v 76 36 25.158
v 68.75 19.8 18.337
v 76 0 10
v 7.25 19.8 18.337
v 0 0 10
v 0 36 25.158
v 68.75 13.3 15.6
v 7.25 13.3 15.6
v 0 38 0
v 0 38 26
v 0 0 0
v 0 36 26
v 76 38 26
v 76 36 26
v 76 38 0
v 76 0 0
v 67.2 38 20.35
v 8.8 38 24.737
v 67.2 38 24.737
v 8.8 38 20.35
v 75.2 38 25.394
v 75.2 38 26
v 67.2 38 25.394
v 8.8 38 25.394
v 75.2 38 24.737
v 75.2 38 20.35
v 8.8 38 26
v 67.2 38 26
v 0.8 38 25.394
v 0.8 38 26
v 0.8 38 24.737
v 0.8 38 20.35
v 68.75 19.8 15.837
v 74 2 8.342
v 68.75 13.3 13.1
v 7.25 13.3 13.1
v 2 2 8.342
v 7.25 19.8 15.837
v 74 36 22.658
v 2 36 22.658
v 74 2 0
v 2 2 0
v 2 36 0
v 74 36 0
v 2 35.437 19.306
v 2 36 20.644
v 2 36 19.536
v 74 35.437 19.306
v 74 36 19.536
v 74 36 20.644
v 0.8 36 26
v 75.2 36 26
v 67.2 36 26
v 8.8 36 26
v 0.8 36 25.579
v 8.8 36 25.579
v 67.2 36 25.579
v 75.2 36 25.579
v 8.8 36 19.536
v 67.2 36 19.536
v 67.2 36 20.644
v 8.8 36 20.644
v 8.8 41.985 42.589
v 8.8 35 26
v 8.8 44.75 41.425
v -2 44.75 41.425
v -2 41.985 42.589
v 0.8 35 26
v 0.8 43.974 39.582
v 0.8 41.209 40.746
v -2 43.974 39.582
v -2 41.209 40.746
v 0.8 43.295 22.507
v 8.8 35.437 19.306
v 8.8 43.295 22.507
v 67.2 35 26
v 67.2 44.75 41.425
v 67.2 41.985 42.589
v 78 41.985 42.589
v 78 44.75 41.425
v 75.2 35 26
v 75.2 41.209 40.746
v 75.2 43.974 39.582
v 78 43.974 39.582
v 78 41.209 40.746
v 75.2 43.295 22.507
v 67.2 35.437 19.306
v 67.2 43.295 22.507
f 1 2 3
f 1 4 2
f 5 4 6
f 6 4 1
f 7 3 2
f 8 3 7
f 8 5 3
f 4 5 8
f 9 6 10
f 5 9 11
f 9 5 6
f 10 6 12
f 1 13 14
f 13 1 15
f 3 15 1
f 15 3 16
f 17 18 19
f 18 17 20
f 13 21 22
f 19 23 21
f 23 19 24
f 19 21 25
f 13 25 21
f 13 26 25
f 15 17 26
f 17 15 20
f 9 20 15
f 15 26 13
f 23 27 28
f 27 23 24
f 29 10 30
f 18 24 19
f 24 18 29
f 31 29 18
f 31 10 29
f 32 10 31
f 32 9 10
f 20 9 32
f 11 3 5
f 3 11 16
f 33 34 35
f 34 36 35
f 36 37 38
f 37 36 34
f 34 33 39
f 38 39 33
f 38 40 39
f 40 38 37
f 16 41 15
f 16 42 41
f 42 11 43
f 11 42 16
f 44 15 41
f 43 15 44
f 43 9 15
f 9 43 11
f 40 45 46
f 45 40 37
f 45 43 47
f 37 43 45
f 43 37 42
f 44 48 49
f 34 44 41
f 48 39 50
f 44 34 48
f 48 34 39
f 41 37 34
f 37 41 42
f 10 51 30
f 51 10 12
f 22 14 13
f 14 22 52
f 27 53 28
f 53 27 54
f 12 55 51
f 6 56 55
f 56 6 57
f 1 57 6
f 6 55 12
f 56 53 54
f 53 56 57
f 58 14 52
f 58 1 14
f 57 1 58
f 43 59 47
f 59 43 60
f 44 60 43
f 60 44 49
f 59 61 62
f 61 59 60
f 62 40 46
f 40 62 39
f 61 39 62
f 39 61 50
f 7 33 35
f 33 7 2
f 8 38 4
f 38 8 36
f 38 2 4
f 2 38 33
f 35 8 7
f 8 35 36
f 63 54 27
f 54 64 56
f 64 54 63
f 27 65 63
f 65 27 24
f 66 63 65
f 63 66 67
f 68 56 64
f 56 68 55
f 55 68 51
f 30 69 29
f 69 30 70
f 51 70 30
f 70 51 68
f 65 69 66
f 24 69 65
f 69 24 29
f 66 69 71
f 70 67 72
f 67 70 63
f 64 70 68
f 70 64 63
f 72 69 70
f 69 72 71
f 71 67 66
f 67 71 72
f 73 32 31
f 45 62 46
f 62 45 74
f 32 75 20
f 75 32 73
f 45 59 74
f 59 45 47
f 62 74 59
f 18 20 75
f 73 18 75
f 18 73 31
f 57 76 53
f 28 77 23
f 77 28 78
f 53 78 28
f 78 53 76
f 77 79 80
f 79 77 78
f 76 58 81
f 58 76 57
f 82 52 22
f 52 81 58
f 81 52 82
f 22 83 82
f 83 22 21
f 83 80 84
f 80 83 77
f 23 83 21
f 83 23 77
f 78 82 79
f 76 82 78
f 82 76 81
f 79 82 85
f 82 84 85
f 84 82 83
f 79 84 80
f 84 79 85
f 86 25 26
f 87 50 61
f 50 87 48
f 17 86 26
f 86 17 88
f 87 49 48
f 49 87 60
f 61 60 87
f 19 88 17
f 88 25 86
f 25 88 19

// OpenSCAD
// ============================================================
// TSC TDP-225 (DT2205) 撥紙模組替換件 v2 — 參數化（單位 mm）
// v2 修正：腳改為側牆的延伸、沿斜面方向伸出（可調角度）
// ============================================================

/* ---------- 實測值 ---------- */
A  = 80;    B  = 76;
G  = 61.5;  Hs = 6.5;
Gx = (B-G)/2;
Gy_ratio = 0.35;   // 開槽沿斜面位置 0=低端 1=高端
I  = 10;  J  = 26;  K  = 38;

/* ---------- 粗估值 ---------- */
D  = 8;     // 腳寬（正面看）
E  = 3;     // 勾伸出量（朝外）
F  = 2;     // 勾厚
L  = 18;    // 腳全長
M  = 2.5;   // 板厚（原1.5加厚）

/* ---------- v2 關鍵參數 ---------- */
leg_angle = atan2(J-I, K);  // 腳的傾角：預設=斜面角(23°)，可改 0=垂直
leg_t     = 3;              // 腳厚（側牆延伸的厚度，原件約2，加厚）
wall      = 2;
fillet_r  = 3;
clr       = 0.2;
$fn=32;

/* ============================================================ */
module slab_profile()  { polygon([[0,I],[K,J],[K,J-M],[0,I-M]]); }
module full_profile()  { polygon([[0,0],[K,0],[K,J],[0,I]]); }

module body() {
    difference() {
        union() {
            rotate([90,0,90]) linear_extrude(B) slab_profile();          // 斜板
            rotate([90,0,90]) linear_extrude(wall) full_profile();       // 左側牆
            translate([B-wall,0,0]) rotate([90,0,90]) linear_extrude(wall) full_profile(); // 右側牆
            cube([B, wall, I]);                                          // 低端牆
            translate([0,K-wall,0]) cube([B, wall, J]);                  // 高端牆
        }
        translate([Gx, K*Gy_ratio, -1]) cube([G, Hs, J+2]);              // 開槽
    }
}

// v2 腳：從高端角落沿斜面方向延伸的扁平臂，勾在末端朝外
// 畫在原點：腳身 X 0..D，勾朝 -X 伸出
module leg() {
    rotate([-leg_angle,0,0])
    union() {
        cube([D, leg_t, L]);                          // 腳身
        translate([-(E-clr), 0, L-F])                 // 勾朝外
            cube([E-clr+1, leg_t, F]);
        translate([0,leg_t,0]) rotate([0,90,0]) linear_extrude(D)
            polygon([[0,0],[0,fillet_r*2],[fillet_r*2,0]]);  // 根部補強
    }
}

body();
// 左腳：勾尖對齊整體最外緣（A寬），A 含勾尖
translate([-(A-B)/2 + (E-clr), K-leg_t, J]) leg();
// 右腳：鏡像
translate([B+(A-B)/2 - (E-clr), K-leg_t, J]) mirror([1,0,0]) leg();

/* 列印：斜面朝下平放｜PETG｜0.2層高｜4周圈｜40%填充｜勾加支撐
   leg_angle 改 0 可讓腳變垂直；試裝主要調 E、clr、leg_angle */
